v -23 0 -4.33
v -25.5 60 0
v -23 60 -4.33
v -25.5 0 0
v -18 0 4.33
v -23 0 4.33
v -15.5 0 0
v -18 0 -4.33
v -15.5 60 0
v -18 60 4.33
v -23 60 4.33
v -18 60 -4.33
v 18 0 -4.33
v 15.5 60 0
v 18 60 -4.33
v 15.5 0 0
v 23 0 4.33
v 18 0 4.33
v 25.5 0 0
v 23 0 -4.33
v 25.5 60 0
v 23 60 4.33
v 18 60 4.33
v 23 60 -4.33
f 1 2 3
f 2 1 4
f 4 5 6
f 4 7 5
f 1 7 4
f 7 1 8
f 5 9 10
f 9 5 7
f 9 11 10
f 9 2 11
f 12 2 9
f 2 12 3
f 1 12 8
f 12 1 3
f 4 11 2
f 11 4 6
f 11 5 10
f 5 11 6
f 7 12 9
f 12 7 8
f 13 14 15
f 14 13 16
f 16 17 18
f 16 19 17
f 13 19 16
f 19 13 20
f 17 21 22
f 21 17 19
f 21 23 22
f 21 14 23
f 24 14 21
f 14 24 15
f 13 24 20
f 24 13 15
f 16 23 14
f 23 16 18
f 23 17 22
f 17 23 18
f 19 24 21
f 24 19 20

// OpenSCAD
// file: leverMounting.scad
use <presser.scad>
use <leverArms.scad>

mountingDistance = 18;
mountingBottomHoleCenter = 2;
function mountingHoles_getBottomPosition() = [0,0,mountingBottomHoleCenter];
function mountingHoles_getTopPosition() = [0,0,mountingBottomHoleCenter + mountingDistance];
presserR = presser_getR();
holeR = 1;


module mountingHoles(ang = 0)
{
    translate([0,0,mountingDistance/2 + mountingBottomHoleCenter]) rotate([ang,0,0])    union()
    {
        #translate([-presserR - 15, 0, mountingDistance / 2]) rotate([0, 90, 0]) cylinder(h = 2 * presserR + 30, r = holeR, $fn =32);
        #translate([-presserR - 15, 0, -mountingDistance / 2]) rotate([0, 90, 0]) cylinder(h = 2 * presserR + 30, r = holeR, $fn =32);
    }
    
}
mountingHoles();
// file: presser.scad
use <leverMounting.scad>


radious = 15;
thickness = 4;
height = 25;

function presser_getR() = radious;
function getPresserAng() = 2;

presser();
module presser()
{
    difference()
    {
        cylinder(h = height, r = radious, $fn =64);
        translate([0,0,-1])cylinder(h = height + 2, r = radious - thickness);
        
        mountingHoles(getPresserAng());
    }
    
}
// main file
use <presser.scad>

armsLen = 60;
distanceR = presser_getR() + 0.5;
profileR = 5;

function leverArms_getProfileR() =  profileR;
function leverArms_getDistanceR() = distanceR;



module leverArms_profile()
{
    circle(r = profileR, $fn = 6);
}

module leverArms()
{
    union()
    {
        translate([-(distanceR + profileR), 0, 0]) rotate([-90,0,0])  linear_extrude(    armsLen) leverArms_profile();
        translate([+(distanceR + profileR), 0, 0]) rotate([-90,0,0])  linear_extrude(    armsLen) leverArms_profile();
    }
}
leverArms();
